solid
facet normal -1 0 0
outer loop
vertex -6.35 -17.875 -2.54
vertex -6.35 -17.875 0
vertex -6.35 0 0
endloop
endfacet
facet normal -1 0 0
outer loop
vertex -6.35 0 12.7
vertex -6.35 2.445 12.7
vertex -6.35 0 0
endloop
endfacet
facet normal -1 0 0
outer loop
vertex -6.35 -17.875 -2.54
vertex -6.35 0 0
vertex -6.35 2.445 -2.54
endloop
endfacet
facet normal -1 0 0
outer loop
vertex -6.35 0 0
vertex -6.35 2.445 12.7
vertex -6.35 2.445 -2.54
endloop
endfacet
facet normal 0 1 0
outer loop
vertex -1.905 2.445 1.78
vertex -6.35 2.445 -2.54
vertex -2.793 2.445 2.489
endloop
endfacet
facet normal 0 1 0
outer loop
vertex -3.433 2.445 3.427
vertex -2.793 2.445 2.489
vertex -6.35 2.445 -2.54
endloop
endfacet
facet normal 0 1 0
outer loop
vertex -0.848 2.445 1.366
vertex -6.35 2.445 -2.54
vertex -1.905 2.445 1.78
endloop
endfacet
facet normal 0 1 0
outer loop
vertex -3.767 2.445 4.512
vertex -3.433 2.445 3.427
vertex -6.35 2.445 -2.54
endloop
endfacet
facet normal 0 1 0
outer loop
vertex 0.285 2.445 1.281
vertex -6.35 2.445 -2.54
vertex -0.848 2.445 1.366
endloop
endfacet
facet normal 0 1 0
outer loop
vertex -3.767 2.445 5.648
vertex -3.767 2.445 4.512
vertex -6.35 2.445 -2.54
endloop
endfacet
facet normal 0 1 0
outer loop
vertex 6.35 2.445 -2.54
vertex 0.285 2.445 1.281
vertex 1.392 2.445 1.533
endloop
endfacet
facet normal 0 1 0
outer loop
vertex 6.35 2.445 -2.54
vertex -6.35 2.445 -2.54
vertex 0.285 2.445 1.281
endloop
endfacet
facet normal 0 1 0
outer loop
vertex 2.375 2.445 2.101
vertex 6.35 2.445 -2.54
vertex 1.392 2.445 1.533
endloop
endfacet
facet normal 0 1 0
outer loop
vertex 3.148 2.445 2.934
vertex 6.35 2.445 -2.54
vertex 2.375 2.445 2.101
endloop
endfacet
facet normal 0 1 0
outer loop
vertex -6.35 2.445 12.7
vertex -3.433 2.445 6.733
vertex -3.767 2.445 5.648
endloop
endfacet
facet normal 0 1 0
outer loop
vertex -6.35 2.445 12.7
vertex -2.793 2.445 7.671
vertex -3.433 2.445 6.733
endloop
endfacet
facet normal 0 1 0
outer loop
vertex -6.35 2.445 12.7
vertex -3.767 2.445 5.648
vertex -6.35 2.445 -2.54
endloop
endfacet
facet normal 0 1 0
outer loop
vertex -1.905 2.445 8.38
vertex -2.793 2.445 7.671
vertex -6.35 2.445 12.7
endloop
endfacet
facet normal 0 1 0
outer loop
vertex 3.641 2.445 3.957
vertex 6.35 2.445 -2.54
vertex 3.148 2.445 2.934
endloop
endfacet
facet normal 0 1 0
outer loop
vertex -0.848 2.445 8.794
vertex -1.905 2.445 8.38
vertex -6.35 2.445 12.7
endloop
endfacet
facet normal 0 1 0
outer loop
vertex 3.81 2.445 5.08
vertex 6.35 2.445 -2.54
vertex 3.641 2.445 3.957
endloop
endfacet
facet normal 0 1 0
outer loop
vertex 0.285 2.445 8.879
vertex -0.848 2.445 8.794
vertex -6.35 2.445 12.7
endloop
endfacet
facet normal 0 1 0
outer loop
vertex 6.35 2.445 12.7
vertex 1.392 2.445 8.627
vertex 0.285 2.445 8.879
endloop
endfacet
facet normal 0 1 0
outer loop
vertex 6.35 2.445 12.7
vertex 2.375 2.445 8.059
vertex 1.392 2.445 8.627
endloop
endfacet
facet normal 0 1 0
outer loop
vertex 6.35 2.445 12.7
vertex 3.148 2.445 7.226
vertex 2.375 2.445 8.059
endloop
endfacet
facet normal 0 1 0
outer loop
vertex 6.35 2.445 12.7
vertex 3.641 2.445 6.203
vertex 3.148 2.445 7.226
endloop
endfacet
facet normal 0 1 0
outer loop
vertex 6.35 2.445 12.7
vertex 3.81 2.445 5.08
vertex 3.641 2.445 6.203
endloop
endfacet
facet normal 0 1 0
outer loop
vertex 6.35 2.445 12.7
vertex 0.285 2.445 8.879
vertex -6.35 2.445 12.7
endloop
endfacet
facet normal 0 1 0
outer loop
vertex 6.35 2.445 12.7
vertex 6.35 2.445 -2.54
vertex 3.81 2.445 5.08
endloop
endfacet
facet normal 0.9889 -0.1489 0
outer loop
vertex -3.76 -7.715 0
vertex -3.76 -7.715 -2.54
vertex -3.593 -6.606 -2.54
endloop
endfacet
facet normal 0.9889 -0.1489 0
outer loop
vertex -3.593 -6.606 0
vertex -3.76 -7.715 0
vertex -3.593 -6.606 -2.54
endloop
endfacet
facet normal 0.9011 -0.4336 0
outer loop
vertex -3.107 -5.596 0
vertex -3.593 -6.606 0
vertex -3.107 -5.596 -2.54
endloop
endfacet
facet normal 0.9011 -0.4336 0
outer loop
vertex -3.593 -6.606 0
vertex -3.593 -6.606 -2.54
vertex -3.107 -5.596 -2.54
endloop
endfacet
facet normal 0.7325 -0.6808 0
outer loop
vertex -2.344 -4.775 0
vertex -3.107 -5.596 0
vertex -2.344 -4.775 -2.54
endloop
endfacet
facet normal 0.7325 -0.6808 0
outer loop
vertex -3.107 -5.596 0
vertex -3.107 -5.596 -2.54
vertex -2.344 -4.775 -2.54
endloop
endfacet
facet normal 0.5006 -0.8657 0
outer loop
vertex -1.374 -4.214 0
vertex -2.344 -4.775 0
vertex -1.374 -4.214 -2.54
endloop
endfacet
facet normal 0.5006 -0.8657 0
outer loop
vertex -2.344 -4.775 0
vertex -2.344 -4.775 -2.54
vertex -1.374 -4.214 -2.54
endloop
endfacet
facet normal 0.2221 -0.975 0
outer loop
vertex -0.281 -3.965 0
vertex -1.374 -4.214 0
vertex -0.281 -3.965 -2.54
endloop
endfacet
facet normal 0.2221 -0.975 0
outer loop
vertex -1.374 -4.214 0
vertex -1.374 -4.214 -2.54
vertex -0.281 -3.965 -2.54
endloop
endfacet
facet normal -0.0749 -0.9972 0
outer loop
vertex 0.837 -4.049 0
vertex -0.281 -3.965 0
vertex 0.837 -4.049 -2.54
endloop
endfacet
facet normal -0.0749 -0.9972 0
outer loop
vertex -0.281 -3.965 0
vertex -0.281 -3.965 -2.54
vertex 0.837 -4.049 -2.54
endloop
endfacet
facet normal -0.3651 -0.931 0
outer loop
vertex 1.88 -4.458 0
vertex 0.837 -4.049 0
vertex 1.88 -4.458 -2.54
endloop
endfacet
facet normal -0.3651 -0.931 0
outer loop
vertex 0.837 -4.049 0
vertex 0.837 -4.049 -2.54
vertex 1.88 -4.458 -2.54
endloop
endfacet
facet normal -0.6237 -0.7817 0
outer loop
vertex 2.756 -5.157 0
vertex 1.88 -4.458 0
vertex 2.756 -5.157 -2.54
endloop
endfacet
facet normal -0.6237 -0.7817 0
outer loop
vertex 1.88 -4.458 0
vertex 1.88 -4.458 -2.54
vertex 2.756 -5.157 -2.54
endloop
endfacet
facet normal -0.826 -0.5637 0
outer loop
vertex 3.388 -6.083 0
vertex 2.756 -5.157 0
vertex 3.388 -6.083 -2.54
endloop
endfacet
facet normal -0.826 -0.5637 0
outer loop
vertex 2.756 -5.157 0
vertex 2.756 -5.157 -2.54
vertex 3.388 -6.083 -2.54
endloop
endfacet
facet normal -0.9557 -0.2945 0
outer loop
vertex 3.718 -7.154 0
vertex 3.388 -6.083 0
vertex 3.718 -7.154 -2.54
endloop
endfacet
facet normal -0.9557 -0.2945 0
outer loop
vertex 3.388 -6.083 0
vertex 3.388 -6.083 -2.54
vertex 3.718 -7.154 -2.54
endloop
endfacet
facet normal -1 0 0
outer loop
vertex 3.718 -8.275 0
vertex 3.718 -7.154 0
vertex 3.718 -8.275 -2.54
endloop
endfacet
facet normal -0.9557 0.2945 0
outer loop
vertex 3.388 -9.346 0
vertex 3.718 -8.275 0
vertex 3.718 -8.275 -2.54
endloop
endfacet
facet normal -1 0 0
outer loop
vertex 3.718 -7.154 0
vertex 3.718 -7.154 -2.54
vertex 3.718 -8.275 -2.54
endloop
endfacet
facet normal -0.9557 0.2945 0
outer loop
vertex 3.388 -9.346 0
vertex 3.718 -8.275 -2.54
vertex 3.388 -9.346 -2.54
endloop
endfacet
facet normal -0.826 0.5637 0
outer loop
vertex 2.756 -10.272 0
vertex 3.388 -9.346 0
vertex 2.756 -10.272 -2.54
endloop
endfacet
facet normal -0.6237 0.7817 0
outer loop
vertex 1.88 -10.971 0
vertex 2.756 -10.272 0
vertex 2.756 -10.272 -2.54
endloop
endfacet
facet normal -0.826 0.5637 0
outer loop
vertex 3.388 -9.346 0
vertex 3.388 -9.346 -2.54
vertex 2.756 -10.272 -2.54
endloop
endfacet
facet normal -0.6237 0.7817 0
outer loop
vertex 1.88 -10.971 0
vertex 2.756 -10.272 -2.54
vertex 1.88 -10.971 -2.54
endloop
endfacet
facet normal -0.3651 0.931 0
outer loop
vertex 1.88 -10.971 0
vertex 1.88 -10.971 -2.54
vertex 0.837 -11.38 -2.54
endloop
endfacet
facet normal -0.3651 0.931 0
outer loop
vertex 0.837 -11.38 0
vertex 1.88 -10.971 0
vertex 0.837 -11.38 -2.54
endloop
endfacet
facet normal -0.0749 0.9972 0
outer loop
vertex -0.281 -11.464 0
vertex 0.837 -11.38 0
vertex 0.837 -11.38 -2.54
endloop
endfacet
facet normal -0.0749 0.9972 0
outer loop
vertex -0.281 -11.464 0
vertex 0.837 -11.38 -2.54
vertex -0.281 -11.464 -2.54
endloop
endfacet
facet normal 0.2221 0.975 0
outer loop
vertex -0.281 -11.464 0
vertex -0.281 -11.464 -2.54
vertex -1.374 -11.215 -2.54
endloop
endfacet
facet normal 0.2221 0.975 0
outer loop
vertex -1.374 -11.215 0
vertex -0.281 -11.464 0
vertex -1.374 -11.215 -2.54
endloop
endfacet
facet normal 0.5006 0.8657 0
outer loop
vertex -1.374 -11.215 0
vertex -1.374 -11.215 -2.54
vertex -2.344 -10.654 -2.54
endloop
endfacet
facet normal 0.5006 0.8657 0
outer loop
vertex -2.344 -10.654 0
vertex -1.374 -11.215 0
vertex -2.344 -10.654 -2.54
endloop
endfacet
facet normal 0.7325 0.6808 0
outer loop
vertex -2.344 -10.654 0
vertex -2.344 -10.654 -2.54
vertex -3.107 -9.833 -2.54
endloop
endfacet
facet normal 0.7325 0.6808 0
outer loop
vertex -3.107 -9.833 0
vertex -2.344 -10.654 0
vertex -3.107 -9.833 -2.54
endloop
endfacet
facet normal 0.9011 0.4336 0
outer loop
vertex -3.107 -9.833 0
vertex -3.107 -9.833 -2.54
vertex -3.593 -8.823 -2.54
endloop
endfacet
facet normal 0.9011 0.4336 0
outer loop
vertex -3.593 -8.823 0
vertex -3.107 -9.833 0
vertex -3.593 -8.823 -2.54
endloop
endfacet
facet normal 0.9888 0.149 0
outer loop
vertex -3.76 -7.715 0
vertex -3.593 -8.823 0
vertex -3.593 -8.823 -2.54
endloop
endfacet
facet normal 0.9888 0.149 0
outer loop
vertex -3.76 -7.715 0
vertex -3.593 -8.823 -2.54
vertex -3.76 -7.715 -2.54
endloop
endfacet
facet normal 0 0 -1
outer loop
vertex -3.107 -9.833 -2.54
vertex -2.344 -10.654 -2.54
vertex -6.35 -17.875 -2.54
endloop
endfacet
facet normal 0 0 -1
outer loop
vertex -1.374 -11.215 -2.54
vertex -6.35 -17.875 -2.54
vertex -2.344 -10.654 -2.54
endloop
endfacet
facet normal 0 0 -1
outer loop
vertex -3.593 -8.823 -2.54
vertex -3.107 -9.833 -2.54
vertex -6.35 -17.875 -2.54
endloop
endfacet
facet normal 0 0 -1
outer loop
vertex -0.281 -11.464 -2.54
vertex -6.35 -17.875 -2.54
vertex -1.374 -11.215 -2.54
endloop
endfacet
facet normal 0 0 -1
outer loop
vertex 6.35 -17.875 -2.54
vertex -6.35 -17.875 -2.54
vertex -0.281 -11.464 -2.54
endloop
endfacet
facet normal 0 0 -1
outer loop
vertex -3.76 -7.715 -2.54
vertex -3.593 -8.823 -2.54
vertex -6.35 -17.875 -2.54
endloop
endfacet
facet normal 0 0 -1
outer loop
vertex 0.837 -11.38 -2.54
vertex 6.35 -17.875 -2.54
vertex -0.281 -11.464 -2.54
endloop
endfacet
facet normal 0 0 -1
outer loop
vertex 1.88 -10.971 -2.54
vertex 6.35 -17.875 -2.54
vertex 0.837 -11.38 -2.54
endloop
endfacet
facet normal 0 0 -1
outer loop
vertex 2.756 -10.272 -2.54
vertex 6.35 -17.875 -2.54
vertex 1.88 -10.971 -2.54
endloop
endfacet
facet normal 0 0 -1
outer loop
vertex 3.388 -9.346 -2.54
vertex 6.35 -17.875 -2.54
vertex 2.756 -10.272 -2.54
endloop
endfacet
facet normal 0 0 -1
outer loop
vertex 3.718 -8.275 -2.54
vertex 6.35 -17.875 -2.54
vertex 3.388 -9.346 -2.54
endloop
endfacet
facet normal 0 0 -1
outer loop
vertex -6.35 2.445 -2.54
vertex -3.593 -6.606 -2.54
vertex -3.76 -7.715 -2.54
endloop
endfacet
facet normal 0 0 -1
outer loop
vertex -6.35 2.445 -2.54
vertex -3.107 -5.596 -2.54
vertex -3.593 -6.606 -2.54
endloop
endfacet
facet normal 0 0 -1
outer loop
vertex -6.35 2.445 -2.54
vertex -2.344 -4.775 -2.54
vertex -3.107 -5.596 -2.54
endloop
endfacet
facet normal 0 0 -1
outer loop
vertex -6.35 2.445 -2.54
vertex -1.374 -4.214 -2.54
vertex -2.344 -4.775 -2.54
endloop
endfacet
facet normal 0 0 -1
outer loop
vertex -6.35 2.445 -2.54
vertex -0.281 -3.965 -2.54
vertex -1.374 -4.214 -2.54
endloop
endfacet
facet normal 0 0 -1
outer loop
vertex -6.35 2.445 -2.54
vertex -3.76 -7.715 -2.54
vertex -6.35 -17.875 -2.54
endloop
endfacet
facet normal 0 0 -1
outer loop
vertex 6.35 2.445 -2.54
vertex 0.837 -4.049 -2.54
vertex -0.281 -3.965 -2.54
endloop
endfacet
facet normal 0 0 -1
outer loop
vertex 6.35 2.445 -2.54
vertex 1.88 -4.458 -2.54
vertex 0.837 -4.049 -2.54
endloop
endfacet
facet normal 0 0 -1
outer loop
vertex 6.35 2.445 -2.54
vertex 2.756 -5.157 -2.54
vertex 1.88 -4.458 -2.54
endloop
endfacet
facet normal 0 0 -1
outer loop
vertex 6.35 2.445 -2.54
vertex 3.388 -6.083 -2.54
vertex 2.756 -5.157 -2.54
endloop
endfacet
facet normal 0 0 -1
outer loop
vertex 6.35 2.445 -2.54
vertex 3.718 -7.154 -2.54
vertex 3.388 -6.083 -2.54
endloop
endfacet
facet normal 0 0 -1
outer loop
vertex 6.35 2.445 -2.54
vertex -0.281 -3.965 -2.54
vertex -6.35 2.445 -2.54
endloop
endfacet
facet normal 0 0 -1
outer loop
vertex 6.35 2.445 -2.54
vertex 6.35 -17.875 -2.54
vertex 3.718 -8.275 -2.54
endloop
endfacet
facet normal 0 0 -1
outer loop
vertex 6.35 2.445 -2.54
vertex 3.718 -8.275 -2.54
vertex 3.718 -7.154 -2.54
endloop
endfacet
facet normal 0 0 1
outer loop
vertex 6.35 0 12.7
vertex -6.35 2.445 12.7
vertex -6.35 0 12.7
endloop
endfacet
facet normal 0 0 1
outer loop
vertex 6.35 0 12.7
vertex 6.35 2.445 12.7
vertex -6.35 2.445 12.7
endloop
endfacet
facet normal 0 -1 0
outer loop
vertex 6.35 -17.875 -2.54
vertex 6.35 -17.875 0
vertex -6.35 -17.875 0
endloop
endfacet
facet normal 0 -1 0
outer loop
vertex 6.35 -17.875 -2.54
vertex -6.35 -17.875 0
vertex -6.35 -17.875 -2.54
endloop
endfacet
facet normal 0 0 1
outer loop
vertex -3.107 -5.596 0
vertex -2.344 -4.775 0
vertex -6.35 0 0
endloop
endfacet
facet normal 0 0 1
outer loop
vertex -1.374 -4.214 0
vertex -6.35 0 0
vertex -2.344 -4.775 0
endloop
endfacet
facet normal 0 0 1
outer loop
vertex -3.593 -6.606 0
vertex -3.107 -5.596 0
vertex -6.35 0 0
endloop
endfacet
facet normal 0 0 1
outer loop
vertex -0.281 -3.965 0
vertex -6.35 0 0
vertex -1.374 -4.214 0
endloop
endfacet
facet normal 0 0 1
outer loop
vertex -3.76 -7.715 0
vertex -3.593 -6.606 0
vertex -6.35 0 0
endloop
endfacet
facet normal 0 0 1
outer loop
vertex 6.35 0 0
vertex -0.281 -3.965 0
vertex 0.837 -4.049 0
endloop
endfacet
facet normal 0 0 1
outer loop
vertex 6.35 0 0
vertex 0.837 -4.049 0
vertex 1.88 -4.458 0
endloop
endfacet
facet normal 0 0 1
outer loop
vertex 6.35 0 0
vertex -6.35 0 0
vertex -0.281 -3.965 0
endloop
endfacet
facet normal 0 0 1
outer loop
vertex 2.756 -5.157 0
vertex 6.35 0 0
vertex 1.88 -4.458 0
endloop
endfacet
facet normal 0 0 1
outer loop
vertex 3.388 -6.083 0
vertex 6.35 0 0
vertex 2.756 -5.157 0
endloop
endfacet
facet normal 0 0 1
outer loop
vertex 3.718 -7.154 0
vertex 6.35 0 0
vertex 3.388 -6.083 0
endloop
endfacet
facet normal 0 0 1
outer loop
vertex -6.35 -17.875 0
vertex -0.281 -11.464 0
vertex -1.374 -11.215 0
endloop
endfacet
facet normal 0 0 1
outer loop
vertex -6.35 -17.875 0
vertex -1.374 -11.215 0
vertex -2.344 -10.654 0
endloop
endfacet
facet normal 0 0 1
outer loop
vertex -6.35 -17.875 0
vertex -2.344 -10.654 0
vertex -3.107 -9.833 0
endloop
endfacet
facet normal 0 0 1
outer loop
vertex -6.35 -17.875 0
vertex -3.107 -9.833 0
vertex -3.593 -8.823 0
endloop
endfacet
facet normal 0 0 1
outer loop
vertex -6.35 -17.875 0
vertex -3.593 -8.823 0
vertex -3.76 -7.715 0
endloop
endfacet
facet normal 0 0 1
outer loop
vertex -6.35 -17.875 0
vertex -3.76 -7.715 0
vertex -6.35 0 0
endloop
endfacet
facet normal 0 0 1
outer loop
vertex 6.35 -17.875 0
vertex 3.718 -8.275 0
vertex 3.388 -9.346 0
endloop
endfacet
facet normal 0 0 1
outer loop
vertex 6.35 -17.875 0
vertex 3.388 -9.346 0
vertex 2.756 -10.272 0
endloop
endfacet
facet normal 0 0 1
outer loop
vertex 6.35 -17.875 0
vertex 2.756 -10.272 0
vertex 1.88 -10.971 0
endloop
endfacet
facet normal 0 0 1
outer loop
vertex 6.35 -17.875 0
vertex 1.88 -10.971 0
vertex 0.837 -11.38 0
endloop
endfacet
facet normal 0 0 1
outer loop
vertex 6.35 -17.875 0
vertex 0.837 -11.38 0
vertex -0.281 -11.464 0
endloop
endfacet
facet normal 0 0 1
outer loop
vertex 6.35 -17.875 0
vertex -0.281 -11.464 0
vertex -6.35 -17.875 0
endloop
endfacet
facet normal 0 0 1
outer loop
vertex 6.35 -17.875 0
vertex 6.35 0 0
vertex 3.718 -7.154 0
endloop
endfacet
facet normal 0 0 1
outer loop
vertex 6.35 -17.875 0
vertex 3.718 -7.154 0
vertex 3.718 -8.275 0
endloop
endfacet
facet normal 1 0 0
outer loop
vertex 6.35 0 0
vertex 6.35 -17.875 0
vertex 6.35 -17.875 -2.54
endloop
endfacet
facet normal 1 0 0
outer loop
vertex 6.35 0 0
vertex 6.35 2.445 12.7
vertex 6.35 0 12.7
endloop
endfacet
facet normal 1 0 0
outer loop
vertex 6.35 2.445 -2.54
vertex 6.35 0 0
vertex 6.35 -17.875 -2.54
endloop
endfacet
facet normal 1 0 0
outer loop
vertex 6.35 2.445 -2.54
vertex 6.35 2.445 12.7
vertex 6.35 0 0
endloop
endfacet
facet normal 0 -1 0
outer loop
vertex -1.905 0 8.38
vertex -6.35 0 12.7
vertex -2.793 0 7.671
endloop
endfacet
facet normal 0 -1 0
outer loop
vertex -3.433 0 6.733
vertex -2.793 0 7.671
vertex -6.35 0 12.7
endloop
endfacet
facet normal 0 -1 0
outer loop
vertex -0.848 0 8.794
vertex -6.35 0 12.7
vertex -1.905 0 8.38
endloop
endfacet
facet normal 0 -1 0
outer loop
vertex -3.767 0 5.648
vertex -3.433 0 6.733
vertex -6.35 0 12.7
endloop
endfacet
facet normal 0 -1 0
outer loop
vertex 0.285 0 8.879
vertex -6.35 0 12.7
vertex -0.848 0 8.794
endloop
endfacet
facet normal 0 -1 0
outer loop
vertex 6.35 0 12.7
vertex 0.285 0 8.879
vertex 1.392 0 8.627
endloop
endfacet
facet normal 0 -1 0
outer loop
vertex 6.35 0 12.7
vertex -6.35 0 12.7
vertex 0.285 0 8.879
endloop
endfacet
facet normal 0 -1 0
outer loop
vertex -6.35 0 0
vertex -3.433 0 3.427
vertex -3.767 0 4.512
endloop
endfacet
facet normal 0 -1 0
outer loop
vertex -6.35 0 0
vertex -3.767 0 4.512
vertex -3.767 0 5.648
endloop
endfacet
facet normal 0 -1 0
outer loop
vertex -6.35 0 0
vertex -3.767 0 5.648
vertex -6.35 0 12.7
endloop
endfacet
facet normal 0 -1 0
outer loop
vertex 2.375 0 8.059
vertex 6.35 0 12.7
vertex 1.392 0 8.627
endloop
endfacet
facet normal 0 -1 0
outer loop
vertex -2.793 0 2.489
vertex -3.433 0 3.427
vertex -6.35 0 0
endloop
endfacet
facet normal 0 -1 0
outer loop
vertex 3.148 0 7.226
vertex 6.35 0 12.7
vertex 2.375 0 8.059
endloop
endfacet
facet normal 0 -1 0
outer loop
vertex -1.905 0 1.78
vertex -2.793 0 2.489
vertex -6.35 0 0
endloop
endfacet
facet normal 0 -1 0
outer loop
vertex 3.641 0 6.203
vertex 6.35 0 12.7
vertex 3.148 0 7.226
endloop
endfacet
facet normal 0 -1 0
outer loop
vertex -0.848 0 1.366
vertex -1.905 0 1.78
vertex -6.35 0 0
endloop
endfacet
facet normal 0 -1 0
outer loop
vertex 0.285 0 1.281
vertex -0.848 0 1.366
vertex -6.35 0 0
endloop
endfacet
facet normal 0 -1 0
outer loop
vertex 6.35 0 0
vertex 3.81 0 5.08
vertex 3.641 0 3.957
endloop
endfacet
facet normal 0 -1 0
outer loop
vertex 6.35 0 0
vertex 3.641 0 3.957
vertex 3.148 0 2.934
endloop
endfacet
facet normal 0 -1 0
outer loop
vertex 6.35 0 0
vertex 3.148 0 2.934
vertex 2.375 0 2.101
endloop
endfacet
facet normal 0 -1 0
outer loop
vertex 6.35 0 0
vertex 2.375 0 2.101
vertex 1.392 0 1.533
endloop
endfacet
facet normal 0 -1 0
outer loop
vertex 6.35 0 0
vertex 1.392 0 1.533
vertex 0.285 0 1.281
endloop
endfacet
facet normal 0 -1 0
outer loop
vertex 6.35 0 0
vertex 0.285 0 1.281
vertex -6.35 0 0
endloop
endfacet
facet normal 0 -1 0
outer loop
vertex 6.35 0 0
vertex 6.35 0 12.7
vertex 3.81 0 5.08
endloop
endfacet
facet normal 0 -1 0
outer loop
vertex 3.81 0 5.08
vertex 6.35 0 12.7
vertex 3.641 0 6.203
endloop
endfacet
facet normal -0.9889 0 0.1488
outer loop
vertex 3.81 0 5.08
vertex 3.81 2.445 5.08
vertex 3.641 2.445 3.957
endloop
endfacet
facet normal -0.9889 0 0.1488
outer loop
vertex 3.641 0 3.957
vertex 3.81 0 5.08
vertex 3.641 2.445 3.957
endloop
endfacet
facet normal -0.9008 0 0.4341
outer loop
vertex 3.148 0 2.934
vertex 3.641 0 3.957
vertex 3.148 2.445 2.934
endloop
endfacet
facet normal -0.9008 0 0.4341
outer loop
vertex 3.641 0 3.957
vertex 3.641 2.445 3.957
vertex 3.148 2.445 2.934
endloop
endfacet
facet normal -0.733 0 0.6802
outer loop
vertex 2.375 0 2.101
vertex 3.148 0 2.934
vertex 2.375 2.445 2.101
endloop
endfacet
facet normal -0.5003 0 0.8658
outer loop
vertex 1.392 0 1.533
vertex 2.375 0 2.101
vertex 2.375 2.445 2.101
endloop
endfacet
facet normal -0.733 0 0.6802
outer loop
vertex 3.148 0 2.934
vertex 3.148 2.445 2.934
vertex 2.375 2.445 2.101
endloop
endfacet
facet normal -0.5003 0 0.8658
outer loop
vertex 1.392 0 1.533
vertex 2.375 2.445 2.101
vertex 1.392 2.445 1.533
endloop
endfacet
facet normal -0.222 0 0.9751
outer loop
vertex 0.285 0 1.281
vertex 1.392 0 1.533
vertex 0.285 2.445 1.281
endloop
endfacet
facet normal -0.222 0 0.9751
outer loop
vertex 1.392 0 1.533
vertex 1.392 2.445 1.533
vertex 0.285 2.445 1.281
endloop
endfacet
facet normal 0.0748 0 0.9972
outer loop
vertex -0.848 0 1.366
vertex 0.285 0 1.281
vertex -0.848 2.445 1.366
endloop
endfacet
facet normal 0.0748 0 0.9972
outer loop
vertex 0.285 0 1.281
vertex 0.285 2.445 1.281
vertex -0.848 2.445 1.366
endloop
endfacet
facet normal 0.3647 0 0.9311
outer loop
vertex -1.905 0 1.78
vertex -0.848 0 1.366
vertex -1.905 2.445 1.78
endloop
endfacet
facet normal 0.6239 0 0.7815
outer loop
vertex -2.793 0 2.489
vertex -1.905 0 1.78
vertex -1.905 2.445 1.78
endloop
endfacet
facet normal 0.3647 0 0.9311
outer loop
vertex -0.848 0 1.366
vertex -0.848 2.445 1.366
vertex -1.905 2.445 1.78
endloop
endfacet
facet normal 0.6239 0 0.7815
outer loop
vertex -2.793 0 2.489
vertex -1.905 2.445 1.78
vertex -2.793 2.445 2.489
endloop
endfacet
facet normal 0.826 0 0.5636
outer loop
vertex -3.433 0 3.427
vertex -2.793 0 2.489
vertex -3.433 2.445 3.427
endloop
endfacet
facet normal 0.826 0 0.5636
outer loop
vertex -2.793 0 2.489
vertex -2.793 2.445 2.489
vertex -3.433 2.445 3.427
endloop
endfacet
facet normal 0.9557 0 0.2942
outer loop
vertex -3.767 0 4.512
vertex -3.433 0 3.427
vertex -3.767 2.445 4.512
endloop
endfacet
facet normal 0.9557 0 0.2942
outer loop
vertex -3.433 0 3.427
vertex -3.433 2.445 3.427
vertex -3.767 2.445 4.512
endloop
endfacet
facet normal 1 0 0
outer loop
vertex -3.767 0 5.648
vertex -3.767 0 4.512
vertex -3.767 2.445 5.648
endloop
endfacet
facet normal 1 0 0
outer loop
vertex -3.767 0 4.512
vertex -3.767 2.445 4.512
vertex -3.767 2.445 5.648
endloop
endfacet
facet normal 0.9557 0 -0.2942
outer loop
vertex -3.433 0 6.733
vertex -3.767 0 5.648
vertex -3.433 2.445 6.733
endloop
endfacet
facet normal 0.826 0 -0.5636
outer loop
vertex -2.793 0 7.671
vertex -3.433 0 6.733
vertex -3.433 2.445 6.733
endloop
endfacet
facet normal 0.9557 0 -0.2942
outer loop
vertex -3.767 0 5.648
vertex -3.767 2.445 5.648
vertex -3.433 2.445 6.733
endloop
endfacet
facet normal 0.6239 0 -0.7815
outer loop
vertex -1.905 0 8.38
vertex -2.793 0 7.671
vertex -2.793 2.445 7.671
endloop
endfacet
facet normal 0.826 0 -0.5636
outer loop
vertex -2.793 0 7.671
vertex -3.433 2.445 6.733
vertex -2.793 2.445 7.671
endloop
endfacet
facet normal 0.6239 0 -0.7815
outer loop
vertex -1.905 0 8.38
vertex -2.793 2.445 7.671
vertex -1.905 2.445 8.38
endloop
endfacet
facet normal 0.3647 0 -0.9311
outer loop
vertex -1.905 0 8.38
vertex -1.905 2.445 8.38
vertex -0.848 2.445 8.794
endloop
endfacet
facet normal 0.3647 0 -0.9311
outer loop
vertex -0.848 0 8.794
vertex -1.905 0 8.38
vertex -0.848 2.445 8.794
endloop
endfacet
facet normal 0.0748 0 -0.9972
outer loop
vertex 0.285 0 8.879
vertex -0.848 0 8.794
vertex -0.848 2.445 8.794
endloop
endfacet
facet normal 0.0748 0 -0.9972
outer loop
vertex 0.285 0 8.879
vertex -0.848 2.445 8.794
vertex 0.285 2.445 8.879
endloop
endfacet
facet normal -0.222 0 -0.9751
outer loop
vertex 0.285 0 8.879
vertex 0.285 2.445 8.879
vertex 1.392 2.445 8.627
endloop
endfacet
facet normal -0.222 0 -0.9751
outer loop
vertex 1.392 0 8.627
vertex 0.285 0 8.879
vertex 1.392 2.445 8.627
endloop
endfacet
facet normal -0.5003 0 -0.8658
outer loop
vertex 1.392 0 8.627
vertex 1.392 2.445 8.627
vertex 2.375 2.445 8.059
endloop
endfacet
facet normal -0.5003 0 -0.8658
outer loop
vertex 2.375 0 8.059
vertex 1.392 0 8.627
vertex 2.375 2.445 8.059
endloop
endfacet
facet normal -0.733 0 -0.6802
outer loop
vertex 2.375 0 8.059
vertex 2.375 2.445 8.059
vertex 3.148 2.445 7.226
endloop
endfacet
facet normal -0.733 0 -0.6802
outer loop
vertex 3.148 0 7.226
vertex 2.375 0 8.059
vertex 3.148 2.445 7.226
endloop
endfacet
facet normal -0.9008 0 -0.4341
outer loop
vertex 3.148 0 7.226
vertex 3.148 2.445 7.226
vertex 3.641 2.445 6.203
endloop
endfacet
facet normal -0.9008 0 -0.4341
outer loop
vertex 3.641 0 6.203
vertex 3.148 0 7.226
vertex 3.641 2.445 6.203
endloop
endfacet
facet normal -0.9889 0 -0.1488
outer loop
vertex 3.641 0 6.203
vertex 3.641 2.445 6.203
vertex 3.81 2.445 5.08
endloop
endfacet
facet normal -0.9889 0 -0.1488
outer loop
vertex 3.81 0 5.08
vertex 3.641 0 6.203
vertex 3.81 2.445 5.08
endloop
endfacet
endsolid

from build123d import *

# Parameters (mm, degrees)
BOSS_EXTRUDE1_DEPTH = 6.35
SKETCH6_R           = 3.760114337
CUT_EXTRUDE3_DEPTH  = 12.7
SKETCH8_R           = 3.81
CUT_EXTRUDE4_DEPTH  = 2.54


with BuildPart() as part:
    # Sketch1 → Boss-Extrude1 (new body, symmetric)
    with BuildSketch(Plane(origin=(0, 0, 0), x_dir=(0, 0, -1), z_dir=(1, 0, 0))):
        Polygon((0, 0), (0, -17.874529582), (2.54, -17.874529582), (2.54, 2.445470418), (-12.7, 2.445470418), (-12.7, 0), align=None)
    extrude(amount=BOSS_EXTRUDE1_DEPTH, both=True)

    # Sketch6 → Cut-Extrude3 (cut)
    with BuildSketch(Plane(origin=(0, 0, -2.54), x_dir=(-1, 0, 0), z_dir=(0, 0, -1))):
        with Locations((0, -7.714529582)):
            Circle(SKETCH6_R)
    extrude(amount=-CUT_EXTRUDE3_DEPTH, mode=Mode.SUBTRACT)

    # Sketch8 → Cut-Extrude4 (cut)
    with BuildSketch(Plane(origin=(0, 2.445470418, 0), x_dir=(1, 0, 0), z_dir=(0, 1, 0))):
        with Locations((0, -5.08)):
            Circle(SKETCH8_R)
    extrude(amount=-CUT_EXTRUDE4_DEPTH, mode=Mode.SUBTRACT)


solid = part.part
